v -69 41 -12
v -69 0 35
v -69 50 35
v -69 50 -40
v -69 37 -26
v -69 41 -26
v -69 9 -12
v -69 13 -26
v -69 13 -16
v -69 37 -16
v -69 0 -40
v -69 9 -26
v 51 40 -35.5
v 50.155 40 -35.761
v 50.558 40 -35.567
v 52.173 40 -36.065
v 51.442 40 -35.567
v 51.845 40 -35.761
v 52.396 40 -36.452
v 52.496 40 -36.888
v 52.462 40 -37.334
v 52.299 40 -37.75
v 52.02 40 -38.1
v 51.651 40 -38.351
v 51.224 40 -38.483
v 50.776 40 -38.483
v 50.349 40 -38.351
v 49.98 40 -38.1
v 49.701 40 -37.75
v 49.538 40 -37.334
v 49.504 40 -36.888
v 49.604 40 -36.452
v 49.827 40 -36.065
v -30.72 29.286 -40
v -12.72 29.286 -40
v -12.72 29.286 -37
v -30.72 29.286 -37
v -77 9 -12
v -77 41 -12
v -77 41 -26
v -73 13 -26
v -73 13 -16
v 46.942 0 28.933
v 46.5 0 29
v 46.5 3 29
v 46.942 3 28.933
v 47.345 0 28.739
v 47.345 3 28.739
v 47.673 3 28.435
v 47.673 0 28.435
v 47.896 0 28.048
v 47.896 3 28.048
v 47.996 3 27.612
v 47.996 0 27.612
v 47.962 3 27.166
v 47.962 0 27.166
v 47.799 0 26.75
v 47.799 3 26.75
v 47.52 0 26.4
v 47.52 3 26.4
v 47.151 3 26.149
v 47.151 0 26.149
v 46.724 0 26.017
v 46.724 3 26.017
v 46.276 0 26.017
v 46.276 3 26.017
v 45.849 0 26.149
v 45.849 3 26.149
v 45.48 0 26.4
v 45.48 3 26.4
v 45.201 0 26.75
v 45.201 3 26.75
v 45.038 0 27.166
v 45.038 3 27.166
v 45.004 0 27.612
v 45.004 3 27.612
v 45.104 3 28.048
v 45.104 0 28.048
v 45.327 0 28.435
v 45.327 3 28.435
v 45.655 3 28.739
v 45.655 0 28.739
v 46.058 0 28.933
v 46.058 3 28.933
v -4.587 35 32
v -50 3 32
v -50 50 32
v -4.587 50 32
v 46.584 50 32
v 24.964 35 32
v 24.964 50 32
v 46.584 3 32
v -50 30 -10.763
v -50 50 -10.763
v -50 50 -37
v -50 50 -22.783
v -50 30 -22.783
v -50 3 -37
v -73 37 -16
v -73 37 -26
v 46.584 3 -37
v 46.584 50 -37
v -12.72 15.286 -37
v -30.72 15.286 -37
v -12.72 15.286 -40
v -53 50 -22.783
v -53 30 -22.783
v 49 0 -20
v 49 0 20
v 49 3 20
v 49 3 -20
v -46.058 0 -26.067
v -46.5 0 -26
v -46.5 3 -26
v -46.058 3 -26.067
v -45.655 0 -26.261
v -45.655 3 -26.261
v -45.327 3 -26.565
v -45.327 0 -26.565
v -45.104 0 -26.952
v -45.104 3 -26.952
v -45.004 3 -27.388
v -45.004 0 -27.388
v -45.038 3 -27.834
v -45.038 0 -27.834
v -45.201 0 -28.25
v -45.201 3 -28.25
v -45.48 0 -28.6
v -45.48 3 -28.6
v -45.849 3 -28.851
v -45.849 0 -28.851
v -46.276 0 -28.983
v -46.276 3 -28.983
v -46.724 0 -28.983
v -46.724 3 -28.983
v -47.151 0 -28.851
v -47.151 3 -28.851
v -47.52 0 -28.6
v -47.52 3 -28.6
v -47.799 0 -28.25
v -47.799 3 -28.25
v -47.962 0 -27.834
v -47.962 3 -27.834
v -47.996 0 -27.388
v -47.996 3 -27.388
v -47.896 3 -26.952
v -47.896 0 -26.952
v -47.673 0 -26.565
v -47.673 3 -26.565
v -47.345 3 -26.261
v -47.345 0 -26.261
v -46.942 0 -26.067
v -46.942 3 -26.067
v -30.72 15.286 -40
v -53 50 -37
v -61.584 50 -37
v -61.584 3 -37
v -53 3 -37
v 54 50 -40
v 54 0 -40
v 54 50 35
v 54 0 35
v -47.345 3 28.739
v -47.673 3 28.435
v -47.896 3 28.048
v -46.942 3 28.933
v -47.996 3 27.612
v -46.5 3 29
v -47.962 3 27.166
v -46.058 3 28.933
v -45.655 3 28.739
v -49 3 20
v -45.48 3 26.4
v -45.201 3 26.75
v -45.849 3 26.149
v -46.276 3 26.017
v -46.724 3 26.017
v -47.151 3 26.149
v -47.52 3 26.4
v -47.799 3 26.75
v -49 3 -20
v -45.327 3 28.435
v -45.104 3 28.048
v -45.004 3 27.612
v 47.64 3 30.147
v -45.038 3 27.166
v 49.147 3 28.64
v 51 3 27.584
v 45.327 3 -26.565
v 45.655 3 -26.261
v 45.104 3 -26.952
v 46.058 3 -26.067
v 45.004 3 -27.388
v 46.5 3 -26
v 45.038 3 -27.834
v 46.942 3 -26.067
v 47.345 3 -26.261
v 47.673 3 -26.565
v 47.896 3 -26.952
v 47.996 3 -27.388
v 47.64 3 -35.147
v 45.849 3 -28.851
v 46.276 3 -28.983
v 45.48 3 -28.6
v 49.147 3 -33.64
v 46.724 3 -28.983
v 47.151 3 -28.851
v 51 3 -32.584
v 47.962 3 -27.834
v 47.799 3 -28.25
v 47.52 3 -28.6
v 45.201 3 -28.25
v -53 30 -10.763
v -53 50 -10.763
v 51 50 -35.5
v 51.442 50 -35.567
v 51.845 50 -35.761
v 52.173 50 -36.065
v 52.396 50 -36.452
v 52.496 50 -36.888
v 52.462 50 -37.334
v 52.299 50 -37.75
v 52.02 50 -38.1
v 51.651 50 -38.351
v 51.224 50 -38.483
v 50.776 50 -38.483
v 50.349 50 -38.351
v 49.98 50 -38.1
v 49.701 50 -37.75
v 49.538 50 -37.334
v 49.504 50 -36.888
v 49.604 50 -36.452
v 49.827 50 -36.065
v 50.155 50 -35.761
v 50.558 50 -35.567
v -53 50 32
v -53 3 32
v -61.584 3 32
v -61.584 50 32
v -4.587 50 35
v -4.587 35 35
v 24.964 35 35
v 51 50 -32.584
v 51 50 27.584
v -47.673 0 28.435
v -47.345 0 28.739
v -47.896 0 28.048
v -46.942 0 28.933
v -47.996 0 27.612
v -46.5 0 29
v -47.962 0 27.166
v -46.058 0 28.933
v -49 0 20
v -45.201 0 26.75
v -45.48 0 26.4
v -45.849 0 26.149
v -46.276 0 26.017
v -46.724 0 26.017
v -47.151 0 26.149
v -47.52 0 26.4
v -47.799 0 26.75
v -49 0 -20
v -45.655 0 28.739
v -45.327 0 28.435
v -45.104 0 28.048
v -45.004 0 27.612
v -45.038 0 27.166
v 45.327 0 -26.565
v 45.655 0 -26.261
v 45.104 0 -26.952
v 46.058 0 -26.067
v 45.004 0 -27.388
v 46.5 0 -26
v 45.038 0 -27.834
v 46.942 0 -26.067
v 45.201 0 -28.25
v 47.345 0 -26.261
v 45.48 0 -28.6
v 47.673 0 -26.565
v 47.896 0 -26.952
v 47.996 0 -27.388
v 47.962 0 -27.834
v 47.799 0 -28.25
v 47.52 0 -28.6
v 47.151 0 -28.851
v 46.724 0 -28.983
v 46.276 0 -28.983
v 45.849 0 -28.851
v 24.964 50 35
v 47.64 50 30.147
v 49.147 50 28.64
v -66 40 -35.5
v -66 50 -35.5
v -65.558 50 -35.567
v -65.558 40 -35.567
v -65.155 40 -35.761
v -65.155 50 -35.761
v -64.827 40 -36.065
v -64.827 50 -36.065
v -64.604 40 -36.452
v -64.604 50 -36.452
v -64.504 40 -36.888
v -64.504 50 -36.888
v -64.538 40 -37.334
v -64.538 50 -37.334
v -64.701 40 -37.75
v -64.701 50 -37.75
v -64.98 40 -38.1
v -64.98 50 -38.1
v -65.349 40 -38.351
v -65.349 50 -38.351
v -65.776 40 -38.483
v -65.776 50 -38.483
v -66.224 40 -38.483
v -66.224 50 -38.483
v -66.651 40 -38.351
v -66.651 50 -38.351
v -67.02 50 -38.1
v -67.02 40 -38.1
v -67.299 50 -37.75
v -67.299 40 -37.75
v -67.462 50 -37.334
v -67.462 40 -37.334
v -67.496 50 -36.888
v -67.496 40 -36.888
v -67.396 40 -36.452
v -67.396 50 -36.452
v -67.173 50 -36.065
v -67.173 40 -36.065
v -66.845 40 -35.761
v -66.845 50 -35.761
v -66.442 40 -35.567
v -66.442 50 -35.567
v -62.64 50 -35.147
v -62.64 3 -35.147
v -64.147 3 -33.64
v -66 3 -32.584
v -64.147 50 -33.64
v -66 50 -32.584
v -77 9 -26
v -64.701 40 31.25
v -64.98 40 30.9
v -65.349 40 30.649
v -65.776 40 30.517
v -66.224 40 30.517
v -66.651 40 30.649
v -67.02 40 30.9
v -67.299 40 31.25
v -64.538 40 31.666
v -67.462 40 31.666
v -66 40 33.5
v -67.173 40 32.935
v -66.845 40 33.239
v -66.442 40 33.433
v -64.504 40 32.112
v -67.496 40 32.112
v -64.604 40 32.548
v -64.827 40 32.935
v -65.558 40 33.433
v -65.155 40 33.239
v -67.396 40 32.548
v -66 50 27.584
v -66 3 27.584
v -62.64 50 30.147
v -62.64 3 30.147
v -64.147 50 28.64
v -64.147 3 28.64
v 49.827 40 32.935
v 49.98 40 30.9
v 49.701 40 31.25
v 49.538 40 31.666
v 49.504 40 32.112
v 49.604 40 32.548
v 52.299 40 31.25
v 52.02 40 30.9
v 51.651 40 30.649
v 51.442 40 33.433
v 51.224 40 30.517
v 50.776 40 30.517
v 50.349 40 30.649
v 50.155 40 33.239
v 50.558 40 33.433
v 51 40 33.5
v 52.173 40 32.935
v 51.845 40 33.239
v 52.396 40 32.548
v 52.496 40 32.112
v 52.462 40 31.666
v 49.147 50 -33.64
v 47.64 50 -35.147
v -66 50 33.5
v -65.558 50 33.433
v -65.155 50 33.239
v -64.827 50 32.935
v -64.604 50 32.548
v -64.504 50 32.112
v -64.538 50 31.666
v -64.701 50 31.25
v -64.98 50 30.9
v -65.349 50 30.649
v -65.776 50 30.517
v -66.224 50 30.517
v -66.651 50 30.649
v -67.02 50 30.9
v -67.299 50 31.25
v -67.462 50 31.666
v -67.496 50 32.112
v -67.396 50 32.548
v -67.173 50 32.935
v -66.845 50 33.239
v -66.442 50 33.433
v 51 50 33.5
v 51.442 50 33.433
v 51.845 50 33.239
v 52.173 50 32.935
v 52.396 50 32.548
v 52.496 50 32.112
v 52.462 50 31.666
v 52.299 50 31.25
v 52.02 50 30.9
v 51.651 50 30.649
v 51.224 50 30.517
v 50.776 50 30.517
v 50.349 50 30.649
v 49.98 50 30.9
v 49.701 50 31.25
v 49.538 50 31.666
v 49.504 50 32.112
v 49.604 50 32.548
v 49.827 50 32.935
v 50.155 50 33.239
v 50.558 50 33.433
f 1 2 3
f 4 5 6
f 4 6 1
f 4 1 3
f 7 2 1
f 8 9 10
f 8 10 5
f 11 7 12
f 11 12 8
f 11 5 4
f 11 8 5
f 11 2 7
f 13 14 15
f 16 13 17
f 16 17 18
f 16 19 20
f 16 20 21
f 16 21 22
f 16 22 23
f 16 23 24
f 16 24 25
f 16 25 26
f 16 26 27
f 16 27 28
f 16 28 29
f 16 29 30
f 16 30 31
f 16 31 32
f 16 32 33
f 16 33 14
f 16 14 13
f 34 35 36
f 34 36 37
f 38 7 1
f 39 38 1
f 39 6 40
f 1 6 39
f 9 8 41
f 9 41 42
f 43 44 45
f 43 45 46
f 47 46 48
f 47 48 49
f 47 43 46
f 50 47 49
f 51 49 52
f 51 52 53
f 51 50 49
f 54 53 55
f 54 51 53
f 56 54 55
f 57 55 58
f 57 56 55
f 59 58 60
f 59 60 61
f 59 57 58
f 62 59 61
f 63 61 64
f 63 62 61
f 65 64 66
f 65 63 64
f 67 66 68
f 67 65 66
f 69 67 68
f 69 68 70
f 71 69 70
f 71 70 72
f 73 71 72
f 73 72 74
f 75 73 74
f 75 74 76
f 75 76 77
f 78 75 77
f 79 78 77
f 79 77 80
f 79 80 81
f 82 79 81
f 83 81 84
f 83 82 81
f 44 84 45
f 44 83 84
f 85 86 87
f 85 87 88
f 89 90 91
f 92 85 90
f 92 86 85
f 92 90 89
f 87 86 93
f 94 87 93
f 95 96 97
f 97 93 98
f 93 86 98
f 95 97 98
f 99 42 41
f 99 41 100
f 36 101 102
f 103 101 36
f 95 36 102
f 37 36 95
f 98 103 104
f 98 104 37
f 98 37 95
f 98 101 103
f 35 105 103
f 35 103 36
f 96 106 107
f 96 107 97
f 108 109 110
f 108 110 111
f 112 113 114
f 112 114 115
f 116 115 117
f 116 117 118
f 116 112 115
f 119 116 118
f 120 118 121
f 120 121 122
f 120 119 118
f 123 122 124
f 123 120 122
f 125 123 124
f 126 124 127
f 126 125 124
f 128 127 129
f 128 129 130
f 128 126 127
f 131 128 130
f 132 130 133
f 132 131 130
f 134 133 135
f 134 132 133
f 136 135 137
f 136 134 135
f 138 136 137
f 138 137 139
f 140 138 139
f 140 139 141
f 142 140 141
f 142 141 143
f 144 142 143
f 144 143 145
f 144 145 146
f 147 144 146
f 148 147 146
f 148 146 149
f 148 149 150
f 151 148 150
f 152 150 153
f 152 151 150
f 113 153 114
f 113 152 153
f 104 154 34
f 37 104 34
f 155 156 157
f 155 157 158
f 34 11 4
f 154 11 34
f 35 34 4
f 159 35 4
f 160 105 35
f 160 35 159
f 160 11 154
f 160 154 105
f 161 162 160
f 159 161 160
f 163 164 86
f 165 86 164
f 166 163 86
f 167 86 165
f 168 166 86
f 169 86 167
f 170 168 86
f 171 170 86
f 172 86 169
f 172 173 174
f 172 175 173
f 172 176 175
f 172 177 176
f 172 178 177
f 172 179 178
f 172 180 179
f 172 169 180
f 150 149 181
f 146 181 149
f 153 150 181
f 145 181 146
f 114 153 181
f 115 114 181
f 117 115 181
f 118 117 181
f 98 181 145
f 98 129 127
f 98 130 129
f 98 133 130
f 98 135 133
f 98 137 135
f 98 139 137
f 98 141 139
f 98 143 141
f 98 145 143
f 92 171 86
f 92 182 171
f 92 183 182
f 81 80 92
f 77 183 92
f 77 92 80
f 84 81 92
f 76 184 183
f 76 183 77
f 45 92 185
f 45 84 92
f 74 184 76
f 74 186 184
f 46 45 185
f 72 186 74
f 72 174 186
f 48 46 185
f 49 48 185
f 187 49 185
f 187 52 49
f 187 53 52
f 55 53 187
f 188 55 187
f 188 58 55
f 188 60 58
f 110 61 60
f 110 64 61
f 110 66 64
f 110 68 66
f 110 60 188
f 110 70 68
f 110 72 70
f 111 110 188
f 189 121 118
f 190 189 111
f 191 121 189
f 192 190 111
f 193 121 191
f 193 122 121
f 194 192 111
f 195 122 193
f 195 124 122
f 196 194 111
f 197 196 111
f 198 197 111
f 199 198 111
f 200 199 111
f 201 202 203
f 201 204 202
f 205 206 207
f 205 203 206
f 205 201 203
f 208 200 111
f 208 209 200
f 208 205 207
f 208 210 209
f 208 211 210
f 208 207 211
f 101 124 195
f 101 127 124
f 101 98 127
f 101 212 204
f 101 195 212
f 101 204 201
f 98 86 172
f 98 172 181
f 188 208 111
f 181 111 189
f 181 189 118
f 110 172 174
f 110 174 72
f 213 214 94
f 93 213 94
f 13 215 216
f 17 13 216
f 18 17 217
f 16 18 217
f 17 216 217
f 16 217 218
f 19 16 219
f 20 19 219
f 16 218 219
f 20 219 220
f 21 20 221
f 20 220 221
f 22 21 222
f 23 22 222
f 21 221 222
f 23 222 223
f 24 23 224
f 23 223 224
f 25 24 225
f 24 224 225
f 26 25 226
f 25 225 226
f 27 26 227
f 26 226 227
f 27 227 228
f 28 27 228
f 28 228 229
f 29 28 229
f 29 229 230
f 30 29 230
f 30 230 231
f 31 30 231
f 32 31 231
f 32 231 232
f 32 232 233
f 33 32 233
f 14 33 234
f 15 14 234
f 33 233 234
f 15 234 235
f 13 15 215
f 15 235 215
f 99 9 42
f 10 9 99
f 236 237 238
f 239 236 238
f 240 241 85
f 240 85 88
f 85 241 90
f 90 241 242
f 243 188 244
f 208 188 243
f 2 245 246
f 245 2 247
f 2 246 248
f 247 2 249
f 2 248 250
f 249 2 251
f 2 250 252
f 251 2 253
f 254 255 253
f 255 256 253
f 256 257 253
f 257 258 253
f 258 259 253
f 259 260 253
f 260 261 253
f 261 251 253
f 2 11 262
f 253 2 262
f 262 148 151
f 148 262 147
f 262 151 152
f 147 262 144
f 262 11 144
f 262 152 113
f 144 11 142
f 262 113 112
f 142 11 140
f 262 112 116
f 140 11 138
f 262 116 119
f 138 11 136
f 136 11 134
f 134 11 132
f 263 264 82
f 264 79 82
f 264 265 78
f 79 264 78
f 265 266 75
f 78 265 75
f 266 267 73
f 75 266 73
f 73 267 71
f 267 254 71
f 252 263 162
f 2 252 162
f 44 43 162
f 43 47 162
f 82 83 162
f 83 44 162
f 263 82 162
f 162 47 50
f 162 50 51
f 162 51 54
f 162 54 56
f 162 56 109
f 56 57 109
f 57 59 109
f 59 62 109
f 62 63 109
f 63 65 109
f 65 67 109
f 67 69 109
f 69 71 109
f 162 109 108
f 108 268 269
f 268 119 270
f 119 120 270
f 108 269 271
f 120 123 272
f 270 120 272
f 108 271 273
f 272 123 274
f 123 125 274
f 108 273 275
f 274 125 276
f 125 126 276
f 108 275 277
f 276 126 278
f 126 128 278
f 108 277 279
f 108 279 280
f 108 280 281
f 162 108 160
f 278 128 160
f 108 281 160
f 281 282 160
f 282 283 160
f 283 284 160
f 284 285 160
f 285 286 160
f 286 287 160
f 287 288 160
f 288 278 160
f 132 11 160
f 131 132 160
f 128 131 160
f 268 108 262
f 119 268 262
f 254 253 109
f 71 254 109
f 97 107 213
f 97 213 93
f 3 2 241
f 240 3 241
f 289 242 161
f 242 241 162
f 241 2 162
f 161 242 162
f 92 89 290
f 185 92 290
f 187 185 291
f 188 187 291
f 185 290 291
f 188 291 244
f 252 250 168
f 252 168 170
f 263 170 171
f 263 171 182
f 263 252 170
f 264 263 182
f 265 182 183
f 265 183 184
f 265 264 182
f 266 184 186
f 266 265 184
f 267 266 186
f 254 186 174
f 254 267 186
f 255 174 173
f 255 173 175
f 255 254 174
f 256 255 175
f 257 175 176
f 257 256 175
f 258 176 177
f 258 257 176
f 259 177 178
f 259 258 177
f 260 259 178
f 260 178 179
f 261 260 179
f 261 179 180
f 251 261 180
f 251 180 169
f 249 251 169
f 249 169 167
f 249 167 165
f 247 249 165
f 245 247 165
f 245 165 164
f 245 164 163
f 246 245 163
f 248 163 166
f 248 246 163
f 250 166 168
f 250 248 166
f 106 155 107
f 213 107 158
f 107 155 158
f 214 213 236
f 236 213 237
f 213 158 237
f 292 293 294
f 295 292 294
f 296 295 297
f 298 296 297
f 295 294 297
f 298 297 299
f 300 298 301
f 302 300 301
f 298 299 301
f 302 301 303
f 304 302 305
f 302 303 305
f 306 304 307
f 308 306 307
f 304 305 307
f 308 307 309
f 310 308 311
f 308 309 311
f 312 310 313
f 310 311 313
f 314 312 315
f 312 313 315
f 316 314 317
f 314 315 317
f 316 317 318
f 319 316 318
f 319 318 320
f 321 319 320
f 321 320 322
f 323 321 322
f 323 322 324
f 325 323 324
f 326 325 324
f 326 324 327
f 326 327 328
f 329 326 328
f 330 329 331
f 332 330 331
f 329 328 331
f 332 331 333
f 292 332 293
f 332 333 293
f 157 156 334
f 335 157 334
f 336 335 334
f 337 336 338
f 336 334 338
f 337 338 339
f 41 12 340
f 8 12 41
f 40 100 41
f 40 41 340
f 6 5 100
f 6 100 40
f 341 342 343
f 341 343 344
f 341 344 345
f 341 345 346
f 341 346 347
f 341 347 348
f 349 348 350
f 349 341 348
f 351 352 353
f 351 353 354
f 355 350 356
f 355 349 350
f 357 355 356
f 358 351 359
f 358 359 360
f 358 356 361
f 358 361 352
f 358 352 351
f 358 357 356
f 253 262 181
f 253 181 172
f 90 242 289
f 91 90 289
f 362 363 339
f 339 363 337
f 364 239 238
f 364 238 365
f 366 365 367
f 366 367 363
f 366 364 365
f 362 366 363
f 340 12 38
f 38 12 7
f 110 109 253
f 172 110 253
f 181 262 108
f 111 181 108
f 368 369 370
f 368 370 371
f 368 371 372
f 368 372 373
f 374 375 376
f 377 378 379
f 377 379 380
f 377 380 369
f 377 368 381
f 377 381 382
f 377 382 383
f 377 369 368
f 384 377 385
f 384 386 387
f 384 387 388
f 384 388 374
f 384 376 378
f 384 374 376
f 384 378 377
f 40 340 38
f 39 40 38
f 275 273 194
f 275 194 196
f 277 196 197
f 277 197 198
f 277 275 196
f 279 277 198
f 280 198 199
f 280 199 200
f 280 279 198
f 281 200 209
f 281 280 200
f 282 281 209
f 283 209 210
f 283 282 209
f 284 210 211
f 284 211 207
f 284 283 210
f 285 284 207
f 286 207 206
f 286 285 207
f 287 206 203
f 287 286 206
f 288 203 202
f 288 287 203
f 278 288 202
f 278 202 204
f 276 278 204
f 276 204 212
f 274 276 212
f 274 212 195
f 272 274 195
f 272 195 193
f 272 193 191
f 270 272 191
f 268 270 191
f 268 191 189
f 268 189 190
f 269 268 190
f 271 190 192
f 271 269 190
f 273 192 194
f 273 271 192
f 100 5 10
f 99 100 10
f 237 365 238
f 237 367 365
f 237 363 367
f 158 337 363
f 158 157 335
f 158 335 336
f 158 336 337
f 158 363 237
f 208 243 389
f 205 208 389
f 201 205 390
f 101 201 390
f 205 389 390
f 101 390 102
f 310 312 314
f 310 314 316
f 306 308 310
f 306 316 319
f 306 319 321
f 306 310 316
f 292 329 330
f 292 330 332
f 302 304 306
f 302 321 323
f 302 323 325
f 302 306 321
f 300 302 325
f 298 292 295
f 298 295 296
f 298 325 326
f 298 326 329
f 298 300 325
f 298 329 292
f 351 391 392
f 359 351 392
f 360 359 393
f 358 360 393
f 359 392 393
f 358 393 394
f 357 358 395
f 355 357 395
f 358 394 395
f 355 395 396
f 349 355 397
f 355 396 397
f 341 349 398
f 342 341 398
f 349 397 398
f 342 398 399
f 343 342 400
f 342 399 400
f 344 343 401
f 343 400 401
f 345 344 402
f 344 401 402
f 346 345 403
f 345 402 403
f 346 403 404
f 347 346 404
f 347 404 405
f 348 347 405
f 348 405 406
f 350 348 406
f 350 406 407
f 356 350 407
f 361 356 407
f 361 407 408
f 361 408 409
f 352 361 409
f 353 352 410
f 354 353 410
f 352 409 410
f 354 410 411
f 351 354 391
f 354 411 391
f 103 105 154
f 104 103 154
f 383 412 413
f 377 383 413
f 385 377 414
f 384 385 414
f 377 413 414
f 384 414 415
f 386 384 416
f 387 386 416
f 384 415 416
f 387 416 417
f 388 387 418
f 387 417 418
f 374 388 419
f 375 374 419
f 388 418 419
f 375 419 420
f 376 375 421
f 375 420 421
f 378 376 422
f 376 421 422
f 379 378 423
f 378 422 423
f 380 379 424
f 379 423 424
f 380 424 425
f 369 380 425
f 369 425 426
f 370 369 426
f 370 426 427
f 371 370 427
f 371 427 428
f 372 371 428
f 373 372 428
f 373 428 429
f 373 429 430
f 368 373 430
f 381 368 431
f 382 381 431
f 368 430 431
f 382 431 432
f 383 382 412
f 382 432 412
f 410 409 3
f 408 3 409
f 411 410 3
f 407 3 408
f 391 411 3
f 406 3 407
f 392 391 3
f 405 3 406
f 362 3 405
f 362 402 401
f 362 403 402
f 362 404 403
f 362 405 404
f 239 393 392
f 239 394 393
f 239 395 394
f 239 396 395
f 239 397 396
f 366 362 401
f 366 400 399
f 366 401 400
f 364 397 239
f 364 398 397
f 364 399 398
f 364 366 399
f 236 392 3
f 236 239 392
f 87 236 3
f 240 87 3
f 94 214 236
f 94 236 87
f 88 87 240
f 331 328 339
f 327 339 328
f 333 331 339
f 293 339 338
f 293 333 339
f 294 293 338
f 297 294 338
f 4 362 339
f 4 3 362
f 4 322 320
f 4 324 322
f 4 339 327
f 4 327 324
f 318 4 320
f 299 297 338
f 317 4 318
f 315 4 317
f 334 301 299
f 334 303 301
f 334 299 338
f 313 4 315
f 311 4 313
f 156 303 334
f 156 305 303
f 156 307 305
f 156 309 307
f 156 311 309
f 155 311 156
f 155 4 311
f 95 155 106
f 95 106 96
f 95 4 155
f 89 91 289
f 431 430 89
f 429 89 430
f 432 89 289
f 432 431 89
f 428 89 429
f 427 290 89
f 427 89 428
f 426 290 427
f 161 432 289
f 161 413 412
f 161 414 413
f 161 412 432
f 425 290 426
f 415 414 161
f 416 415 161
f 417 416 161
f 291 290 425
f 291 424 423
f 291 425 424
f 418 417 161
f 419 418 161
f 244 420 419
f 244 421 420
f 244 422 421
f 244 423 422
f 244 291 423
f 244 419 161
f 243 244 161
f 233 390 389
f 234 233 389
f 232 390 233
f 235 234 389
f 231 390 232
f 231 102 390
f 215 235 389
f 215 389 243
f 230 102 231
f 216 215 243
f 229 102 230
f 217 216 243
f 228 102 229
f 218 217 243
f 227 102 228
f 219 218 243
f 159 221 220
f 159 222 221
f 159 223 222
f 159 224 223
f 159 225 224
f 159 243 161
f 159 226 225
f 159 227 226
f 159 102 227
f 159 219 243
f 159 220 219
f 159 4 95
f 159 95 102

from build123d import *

# Parameters (mm, degrees)
SKETCH_1_R          = 1.5
EXTRUDE_1_DEPTH     = 3
SKETCH_2_W          = 123
SKETCH_2_H          = 75
EXTRUDE_2_DEPTH     = 47
SKETCH_3_W          = 6.652297382
SKETCH_3_H          = 12.01949186
CUT_EXTRUDE_1_DEPTH = 20
EXTRUDE_3_DEPTH     = 47
SKETCH_5_R          = 1.5
CUT_EXTRUDE_2_DEPTH = 10
SKETCH_7_W          = 4
SKETCH_7_H          = 24
EXTRUDE_4_DEPTH     = 8
SKETCH_8_W          = 4
SKETCH_8_H          = 24
EXTRUDE_5_DEPTH     = 10
SKETCH_9_W          = 14
SKETCH_9_H          = 4
EXTRUDE_6_DEPTH     = 8
SKETCH_10_W         = 29.551054495
SKETCH_10_H         = 15
CUT_EXTRUDE_3_DEPTH = 10
SKETCH_11_W         = 18
SKETCH_11_H         = 14
CUT_EXTRUDE_4_DEPTH = 10


with BuildPart() as part:
    # Эскиз1 → Бобышка-Вытянуть1 (new body)
    with BuildSketch(Plane(origin=(0, 0, 0), x_dir=(1, 0, 0), z_dir=(0, 1, 0))):
        Polygon((54, -3.949274275), (54, 40), (-69, 40), (-69, -35), (54, -35), align=None)
        with Locations(Location((-46.5, 27.5, 0), (0, 0, 270))):
            Circle(SKETCH_1_R, mode=Mode.SUBTRACT)
        with Locations(Location((-46.5, -27.5, 0), (0, 0, 270))):
            Circle(SKETCH_1_R, mode=Mode.SUBTRACT)
        with Locations(Location((46.5, 27.5, 0), (0, 0, 270))):
            Circle(SKETCH_1_R, mode=Mode.SUBTRACT)
        with Locations(Location((46.5, -27.5, 0), (0, 0, 270))):
            Circle(SKETCH_1_R, mode=Mode.SUBTRACT)
        Polygon((-49, 20), (-49, -20), (0, -20), (49, -20), (49, 20), (0, 20), align=None, mode=Mode.SUBTRACT)
    extrude(amount=EXTRUDE_1_DEPTH)

    # Эскиз2 → Бобышка-Вытянуть2 (add)
    with BuildSketch(Plane(origin=(0, 3, 0), x_dir=(1, 0, 0), z_dir=(0, 1, 0))):
        with Locations((-7.5, 2.5)):
            Rectangle(SKETCH_2_W, SKETCH_2_H)
        Polygon((-50, -32), (51, -32), (51, 37), (-50, 37), (-50, 0), align=None, mode=Mode.SUBTRACT)
        Polygon((-66, 37), (-53, 37), (-53, 0), (-53, -32), (-66, -32), align=None, mode=Mode.SUBTRACT)
    extrude(amount=EXTRUDE_2_DEPTH)

    # Эскиз3 → Вырез-Вытянуть1 (cut)
    with BuildSketch(Plane(origin=(0, 50, 0), x_dir=(1, 0, 0), z_dir=(0, 1, 0))):
        with Locations((-51.818044752, 16.773138265)):
            Rectangle(SKETCH_3_W, SKETCH_3_H)
    extrude(amount=-CUT_EXTRUDE_1_DEPTH, mode=Mode.SUBTRACT)

    # Эскиз4 → Бобышка-Вытянуть3 (add)
    with BuildSketch(Plane(origin=(0, 50, 0), x_dir=(1, 0, 0), z_dir=(0, 1, 0))):
        with BuildLine():
            Line((-69, 32), (-69, 40))
            Line((-69, 40), (-61, 40))
            ThreePointArc((-61, 40), (-63.343145751, 34.343145751), (-69, 32))
        make_face()
        with BuildLine():
            Line((46, 40), (54, 40))
            Line((54, 40), (54, 32))
            ThreePointArc((54, 32), (48.343145751, 34.343145751), (46, 40))
        make_face()
        with BuildLine():
            Line((-69, -27), (-69, -35))
            Line((-69, -35), (-61, -35))
            ThreePointArc((-61, -35), (-63.343145751, -29.343145751), (-69, -27))
        make_face()
        with BuildLine():
            Line((54, -27), (54, -35))
            Line((54, -35), (46, -35))
            ThreePointArc((46, -35), (48.343145751, -29.343145751), (54, -27))
        make_face()
    extrude(amount=-EXTRUDE_3_DEPTH)

    # Эскиз5 → Вырез-Вытянуть2 (cut)
    with BuildSketch(Plane(origin=(0, 50, 0), x_dir=(1, 0, 0), z_dir=(0, 1, 0))):
        with Locations(Location((-66, 37, 0), (0, 0, 270))):
            Circle(SKETCH_5_R)
        with Locations(Location((-66, -32, 0), (0, 0, 270))):
            Circle(SKETCH_5_R)
        with Locations(Location((51, -32, 0), (0, 0, 270))):
            Circle(SKETCH_5_R)
        with Locations(Location((51, 37, 0), (0, 0, 270))):
            Circle(SKETCH_5_R)
    extrude(amount=-CUT_EXTRUDE_2_DEPTH, mode=Mode.SUBTRACT)

    # Эскиз7 → Бобышка-Вытянуть4 (add)
    with BuildSketch(Plane.ZY.offset(69)):
        with Locations((-14, 25)):
            Rectangle(SKETCH_7_W, SKETCH_7_H)
    extrude(amount=EXTRUDE_4_DEPTH)

    # Эскиз8 → Бобышка-Вытянуть5 (add)
    with BuildSketch(Plane(origin=(0, 0, -16), x_dir=(-1, 0, 0), z_dir=(0, 0, -1))):
        with Locations((75, 25)):
            Rectangle(SKETCH_8_W, SKETCH_8_H)
    extrude(amount=EXTRUDE_5_DEPTH)

    # Эскиз9 → Бобышка-Вытянуть6 (add)
    with BuildSketch(Plane.ZY.offset(69)):
        with Locations((-19, 39)):
            Rectangle(SKETCH_9_W, SKETCH_9_H)
        with Locations((-19, 11)):
            Rectangle(SKETCH_9_W, SKETCH_9_H)
    extrude(amount=EXTRUDE_6_DEPTH)

    # Эскиз10 → Вырез-Вытянуть3 (cut)
    with BuildSketch(Plane.XY.offset(35)):
        with Locations((10.188847336, 42.5)):
            Rectangle(SKETCH_10_W, SKETCH_10_H)
    extrude(amount=-CUT_EXTRUDE_3_DEPTH, mode=Mode.SUBTRACT)

    # Эскиз11 → Вырез-Вытянуть4 (cut)
    with BuildSketch(Plane(origin=(0, 0, -40), x_dir=(-1, 0, 0), z_dir=(0, 0, -1))):
        with Locations((21.719997663, 22.286107602)):
            Rectangle(SKETCH_11_W, SKETCH_11_H)
    extrude(amount=-CUT_EXTRUDE_4_DEPTH, mode=Mode.SUBTRACT)


solid = part.part
